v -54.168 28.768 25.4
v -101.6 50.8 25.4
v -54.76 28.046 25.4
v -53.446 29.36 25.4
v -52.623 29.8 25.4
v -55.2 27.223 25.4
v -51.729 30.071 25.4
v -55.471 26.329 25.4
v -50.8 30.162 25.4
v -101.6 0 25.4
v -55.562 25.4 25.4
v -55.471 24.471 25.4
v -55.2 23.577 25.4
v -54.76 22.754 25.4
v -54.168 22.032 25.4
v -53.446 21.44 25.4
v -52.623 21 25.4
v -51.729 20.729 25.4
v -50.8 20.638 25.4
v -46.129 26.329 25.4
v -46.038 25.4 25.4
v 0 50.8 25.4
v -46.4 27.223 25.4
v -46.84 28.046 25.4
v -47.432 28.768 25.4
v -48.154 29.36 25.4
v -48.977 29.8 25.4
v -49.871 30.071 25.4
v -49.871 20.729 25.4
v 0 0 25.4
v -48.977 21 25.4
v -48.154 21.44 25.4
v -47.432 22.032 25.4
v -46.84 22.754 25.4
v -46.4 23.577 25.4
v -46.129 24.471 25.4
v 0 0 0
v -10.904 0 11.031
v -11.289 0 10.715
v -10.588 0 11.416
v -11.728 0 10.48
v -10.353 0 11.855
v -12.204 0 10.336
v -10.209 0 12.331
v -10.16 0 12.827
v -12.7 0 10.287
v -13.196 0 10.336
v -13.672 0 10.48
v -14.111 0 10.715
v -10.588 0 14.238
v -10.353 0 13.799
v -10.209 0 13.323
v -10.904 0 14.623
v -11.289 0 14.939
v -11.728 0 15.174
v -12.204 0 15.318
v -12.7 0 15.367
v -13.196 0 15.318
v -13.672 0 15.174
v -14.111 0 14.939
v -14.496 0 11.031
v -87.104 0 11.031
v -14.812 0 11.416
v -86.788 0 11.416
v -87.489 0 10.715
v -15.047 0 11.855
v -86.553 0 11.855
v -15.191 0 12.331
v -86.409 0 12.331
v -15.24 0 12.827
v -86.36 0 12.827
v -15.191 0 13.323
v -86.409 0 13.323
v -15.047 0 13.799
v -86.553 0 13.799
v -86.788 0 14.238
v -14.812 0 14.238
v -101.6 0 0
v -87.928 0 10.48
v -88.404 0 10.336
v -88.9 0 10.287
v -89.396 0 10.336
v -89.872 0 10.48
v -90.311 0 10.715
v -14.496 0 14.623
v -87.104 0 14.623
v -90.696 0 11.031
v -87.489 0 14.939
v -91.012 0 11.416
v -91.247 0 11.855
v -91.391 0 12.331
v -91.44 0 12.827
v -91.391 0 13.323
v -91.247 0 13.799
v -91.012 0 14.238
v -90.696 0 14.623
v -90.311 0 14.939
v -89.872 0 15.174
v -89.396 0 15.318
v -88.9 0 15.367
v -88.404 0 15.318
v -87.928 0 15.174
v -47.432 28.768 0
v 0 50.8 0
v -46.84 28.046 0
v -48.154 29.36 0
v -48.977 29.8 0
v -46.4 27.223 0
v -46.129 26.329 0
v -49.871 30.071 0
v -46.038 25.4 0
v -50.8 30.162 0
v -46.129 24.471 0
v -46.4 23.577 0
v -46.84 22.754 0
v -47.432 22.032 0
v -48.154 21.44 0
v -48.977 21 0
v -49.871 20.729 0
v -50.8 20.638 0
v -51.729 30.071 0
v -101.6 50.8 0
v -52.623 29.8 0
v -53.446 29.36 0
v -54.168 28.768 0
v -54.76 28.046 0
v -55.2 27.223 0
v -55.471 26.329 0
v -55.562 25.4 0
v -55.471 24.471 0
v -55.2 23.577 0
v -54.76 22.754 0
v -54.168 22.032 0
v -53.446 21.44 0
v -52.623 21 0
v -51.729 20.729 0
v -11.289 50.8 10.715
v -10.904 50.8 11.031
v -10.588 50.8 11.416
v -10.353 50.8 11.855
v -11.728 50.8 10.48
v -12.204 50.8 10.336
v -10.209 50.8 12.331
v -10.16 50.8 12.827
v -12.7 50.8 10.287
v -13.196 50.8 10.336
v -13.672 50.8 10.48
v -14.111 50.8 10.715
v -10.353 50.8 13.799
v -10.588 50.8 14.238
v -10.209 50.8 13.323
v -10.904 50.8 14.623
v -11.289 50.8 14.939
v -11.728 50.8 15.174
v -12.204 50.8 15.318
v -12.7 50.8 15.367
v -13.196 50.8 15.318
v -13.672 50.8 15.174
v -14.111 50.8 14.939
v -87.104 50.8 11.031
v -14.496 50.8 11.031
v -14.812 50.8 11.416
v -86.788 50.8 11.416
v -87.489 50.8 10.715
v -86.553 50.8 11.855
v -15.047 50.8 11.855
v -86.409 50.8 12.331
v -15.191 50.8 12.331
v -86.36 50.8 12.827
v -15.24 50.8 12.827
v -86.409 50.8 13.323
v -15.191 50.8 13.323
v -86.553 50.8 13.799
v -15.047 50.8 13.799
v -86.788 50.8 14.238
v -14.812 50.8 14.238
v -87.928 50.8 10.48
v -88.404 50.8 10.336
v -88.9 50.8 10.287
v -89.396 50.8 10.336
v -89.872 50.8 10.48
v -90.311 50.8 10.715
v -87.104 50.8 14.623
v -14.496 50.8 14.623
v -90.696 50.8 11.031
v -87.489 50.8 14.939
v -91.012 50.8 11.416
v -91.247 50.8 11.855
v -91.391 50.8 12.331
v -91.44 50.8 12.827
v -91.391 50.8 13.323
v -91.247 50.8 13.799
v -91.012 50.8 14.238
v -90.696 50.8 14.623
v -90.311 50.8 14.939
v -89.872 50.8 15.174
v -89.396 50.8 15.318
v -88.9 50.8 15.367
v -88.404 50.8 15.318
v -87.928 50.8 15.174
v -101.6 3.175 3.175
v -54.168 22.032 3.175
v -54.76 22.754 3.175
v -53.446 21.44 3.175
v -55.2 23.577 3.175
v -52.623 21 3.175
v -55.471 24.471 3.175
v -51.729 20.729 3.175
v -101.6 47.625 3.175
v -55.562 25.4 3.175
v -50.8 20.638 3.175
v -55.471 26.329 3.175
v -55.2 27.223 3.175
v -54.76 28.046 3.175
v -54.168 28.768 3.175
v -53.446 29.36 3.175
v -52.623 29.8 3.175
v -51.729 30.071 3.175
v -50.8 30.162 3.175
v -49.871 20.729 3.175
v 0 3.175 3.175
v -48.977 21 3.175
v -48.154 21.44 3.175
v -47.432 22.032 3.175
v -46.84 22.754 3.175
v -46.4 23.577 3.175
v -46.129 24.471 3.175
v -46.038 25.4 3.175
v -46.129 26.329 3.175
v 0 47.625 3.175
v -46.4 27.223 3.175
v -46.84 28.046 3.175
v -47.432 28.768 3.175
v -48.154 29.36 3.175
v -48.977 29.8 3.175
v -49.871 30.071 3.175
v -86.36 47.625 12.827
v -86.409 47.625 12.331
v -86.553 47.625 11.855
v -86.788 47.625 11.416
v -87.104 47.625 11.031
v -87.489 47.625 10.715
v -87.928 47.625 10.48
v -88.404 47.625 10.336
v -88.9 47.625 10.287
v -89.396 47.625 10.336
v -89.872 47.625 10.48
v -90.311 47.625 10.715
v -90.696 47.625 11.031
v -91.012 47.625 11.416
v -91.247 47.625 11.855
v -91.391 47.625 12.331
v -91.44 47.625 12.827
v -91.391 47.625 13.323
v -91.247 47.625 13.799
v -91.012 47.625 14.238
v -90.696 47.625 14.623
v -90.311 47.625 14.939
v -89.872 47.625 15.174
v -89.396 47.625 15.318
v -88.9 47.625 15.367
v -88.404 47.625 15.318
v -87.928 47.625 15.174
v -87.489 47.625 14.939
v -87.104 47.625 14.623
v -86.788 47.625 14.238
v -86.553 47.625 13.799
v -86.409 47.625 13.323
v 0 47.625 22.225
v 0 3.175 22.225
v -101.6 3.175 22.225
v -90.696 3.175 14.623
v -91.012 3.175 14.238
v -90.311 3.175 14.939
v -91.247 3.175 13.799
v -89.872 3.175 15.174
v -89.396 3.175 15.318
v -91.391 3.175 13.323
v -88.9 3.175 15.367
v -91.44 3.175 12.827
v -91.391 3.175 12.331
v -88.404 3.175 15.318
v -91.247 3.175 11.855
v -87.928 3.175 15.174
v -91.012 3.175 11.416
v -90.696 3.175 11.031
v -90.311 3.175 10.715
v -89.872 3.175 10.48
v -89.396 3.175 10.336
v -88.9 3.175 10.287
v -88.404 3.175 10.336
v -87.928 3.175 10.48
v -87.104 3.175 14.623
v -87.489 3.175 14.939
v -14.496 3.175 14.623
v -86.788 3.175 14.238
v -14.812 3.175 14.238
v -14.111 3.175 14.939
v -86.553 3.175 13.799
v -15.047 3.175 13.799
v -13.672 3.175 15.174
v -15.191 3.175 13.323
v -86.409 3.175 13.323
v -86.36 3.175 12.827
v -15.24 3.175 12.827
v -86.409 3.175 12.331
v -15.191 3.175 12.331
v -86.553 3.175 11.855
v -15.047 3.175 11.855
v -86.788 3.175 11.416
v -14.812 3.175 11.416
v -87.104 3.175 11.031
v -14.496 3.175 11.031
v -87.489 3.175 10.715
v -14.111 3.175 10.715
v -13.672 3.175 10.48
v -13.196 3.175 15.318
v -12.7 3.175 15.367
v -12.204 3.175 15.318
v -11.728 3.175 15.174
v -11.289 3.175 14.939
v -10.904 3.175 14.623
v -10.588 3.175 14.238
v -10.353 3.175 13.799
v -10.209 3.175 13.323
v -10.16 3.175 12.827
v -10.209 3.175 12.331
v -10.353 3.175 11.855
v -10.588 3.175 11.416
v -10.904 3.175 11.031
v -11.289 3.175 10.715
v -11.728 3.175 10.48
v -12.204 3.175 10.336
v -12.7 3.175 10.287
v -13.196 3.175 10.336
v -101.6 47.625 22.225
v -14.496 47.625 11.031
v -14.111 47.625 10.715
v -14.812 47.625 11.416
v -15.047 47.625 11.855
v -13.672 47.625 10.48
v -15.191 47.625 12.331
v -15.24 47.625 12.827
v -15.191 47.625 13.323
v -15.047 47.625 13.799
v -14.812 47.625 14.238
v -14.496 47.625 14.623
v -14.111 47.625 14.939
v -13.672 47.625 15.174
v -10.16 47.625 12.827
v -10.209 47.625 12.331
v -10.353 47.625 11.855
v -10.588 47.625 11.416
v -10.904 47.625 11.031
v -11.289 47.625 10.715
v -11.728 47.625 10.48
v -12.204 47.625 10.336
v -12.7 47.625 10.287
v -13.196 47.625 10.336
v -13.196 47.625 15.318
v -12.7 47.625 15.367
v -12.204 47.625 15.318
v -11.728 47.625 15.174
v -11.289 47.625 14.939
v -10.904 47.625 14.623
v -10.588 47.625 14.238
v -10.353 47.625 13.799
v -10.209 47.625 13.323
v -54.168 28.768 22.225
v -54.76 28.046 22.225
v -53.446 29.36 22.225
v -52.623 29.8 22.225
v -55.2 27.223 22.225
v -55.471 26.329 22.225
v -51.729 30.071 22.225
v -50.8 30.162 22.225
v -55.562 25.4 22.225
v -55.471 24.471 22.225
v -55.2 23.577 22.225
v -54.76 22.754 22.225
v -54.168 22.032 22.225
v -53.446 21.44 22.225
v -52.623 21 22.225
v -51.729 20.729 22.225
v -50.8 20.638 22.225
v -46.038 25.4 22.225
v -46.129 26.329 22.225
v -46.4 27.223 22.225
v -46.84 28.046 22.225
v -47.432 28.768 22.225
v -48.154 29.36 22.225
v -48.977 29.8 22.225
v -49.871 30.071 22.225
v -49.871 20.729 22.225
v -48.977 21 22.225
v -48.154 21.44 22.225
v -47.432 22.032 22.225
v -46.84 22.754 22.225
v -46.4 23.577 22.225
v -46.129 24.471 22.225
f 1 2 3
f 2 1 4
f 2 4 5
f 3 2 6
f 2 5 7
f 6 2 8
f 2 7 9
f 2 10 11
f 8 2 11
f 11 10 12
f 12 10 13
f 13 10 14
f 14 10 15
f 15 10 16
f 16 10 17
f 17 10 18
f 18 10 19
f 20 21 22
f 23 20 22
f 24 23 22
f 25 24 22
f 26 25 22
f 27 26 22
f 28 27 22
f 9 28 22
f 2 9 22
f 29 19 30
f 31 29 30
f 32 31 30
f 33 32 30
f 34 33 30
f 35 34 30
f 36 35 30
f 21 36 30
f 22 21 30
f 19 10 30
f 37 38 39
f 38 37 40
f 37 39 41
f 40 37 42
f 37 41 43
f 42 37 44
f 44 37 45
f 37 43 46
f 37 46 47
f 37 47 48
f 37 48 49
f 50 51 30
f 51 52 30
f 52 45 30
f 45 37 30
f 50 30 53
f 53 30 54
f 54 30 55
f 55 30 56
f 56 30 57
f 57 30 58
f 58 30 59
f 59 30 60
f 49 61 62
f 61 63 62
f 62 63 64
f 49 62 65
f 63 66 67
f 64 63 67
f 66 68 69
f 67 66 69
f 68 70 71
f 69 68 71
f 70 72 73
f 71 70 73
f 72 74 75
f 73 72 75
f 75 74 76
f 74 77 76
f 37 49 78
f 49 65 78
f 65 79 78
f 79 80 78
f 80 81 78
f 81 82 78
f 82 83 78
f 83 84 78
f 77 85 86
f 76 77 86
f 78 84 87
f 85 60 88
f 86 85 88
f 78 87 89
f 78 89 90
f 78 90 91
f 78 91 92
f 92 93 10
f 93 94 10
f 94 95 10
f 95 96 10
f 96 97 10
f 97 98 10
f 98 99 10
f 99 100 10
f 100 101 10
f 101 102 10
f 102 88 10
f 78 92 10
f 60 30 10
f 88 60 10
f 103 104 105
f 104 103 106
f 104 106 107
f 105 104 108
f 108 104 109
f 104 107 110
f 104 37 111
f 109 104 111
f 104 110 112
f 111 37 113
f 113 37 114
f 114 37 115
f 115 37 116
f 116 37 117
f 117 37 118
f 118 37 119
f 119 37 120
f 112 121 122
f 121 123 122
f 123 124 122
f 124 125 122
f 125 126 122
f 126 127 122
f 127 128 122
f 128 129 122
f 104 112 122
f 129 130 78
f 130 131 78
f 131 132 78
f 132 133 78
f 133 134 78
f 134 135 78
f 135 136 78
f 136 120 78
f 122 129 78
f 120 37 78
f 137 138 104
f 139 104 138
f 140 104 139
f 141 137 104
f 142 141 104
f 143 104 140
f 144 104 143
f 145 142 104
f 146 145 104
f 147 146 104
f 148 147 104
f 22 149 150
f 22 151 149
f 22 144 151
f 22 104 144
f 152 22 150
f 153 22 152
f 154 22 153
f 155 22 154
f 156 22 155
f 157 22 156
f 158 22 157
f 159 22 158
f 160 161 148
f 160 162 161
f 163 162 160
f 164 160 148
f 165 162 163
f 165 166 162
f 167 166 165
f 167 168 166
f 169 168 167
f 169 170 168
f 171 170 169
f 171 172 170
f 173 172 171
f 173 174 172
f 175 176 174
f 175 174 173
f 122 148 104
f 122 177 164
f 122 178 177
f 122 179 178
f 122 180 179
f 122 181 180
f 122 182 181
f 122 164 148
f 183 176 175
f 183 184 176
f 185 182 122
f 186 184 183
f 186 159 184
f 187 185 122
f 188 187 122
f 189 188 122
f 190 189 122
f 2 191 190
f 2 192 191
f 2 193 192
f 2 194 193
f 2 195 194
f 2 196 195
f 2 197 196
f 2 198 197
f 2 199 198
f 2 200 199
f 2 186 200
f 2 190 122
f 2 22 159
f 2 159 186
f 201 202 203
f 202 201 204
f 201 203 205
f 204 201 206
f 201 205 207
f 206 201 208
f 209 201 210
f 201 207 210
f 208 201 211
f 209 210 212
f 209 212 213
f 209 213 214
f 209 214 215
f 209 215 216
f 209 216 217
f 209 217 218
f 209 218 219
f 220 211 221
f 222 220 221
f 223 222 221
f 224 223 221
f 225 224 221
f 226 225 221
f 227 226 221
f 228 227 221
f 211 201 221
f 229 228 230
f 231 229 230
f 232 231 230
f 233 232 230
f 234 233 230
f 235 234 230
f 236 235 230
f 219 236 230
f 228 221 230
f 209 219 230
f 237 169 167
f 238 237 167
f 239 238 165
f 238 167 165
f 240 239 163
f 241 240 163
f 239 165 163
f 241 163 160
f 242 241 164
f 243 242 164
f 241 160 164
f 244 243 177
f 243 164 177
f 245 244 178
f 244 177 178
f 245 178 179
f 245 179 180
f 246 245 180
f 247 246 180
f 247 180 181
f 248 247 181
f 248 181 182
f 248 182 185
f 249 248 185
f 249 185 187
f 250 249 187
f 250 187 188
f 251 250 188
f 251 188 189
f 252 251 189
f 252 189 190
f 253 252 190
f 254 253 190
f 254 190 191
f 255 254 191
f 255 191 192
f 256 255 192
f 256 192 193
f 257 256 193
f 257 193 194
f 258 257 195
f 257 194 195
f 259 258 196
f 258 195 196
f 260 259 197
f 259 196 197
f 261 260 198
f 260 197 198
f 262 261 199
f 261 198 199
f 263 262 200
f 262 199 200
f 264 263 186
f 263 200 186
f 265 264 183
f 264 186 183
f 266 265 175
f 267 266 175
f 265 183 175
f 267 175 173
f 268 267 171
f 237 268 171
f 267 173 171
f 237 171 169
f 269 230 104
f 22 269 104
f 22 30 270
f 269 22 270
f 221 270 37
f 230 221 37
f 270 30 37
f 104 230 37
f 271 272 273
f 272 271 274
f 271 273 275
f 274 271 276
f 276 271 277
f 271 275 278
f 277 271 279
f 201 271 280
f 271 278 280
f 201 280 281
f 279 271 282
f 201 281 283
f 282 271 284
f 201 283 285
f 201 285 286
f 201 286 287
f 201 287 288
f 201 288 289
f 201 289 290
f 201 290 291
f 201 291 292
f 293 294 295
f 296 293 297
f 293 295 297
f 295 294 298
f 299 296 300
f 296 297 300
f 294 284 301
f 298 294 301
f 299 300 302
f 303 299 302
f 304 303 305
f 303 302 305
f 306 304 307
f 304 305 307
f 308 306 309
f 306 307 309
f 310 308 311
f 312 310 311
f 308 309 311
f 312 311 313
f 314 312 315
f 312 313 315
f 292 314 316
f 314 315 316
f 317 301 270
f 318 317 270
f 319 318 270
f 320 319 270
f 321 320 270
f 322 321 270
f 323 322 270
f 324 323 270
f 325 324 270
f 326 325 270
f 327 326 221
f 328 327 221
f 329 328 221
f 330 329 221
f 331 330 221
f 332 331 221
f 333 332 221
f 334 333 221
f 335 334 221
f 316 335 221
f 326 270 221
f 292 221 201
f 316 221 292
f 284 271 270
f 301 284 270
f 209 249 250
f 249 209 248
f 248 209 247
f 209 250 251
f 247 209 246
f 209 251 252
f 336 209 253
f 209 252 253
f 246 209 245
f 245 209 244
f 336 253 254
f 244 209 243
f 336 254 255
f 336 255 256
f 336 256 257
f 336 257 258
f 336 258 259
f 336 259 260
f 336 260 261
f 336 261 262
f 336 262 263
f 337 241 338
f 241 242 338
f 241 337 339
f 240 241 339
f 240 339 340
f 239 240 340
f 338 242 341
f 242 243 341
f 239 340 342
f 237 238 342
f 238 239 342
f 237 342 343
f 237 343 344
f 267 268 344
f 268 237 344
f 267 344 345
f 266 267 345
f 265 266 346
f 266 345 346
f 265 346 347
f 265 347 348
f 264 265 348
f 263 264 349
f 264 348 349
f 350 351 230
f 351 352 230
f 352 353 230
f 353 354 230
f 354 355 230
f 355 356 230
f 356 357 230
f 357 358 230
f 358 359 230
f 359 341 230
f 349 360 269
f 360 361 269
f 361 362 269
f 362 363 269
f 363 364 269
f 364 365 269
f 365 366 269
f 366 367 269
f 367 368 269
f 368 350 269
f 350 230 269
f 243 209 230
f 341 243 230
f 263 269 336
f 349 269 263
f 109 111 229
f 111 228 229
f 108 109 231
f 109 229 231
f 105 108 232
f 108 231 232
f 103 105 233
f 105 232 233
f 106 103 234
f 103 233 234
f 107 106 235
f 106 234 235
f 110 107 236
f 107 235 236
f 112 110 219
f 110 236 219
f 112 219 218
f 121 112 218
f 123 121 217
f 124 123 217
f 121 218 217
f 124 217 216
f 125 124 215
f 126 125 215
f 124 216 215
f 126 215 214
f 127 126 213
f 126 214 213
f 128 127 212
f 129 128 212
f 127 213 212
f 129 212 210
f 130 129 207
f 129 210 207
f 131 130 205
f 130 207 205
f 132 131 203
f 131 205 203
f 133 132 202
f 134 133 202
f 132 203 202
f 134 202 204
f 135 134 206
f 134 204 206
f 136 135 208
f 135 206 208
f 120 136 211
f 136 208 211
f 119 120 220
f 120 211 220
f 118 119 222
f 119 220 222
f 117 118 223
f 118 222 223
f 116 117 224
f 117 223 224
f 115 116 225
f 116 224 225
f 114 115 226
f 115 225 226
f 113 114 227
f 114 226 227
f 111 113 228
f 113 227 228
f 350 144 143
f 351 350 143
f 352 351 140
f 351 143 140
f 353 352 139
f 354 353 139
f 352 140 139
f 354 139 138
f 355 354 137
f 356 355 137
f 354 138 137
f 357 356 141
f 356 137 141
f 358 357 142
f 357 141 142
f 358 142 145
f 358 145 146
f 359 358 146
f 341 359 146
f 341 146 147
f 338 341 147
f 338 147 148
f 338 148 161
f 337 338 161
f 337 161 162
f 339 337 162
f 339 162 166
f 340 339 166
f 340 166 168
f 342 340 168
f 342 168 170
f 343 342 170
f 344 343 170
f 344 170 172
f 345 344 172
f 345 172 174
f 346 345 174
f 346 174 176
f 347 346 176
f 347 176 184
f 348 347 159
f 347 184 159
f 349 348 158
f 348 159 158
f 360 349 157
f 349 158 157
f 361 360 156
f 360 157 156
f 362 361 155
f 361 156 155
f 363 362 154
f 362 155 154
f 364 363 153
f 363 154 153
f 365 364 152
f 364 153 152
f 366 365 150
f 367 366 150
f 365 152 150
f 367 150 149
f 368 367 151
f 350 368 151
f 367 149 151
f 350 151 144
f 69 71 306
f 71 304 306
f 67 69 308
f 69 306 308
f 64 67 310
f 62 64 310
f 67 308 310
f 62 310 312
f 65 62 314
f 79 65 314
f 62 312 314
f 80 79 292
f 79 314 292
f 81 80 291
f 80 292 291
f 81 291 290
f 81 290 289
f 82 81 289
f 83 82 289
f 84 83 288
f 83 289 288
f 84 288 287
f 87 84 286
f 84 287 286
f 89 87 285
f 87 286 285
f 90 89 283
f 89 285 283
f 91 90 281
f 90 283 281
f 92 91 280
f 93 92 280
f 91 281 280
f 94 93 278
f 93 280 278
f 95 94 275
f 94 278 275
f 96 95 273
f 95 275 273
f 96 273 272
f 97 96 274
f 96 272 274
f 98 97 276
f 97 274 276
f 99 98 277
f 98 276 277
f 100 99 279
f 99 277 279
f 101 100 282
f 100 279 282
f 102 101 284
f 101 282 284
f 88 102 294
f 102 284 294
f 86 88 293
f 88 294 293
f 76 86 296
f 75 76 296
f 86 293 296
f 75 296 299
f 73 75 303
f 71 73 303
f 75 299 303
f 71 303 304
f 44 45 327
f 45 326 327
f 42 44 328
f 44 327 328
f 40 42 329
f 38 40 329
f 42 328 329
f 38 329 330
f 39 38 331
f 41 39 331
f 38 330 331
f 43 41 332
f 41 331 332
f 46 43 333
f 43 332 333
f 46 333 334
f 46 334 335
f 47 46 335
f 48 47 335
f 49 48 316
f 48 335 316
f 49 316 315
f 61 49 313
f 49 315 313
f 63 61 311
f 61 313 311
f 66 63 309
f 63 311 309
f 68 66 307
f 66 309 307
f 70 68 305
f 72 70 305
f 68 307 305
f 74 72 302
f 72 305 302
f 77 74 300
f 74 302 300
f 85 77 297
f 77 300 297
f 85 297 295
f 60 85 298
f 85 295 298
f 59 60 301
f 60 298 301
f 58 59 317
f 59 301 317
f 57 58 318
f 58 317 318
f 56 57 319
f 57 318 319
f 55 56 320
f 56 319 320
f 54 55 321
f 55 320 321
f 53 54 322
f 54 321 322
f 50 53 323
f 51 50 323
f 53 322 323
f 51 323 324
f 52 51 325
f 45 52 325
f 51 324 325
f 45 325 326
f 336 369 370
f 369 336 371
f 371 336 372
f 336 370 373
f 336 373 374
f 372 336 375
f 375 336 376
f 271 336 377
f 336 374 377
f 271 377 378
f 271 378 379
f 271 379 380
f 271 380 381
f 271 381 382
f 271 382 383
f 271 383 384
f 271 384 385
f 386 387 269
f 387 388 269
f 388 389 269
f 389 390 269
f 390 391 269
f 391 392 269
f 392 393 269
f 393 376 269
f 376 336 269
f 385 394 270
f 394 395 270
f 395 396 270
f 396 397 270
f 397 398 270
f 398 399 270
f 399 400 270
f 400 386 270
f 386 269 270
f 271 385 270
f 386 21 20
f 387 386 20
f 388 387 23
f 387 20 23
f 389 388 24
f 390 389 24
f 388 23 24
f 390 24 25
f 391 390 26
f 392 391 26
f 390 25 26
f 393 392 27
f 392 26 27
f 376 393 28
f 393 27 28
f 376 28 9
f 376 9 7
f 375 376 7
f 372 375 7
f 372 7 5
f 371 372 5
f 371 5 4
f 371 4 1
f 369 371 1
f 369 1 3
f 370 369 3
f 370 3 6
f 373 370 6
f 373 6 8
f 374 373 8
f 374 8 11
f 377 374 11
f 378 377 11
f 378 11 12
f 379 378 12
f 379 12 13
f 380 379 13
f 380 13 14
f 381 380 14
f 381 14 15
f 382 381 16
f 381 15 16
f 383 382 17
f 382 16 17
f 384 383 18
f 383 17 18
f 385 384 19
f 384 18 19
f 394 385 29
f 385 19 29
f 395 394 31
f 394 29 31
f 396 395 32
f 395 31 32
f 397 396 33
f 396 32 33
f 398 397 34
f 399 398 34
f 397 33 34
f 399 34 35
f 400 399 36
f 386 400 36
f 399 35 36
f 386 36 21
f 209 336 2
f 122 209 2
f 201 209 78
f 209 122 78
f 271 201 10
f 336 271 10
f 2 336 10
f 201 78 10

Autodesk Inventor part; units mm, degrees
ref_plane "YZ Plane" through (0, 0, 0) normal (1, 0, 0) x (0, 1, 0)
ref_plane "XZ Plane" through (0, 0, 0) normal (0, 1, 0) x (-1, 0, 0)
ref_plane "XY Plane" through (0, 0, 0) normal (0, 0, 1) x (1, 0, 0)
sketch "Sketch1" plane through (0, 0, 0) normal (0, 1, 0) x (-1, 0, 0)
  line L0 (0, 0) -> (101.6, 0)
  line L1 (101.6, 0) -> (101.6, 25.4)
  line L2 (101.6, 25.4) -> (0, 25.4)
  line L3 (0, 25.4) -> (0, 0)
  dimension "d0" = 101.6
  dimension "d1" = 25.4
extrude "Extrusion1" add sketch "Sketch1" along normal blind 50.8
sketch "Sketch2" plane through (-101.6, 0, 25.4) normal (0, 0, 1) x (1, 0, 0)
  circle A0 centre (50.8, 25.4) radius 4.7625
  line L0 (101.6, 50.8) -> (0, 50.8) projected
  line L1 (101.6, 0) -> (101.6, 50.8) projected
  dimension "d4" = 9.525
  dimension "d5" = 25.4
  dimension "d6" = 50.8
extrude "Extrusion2" cut sketch "Sketch2" against normal blind 111.125
sketch "Sketch3" plane through (0, 0, 25.4) normal (1, 0, 0) x (0, 0, -1)
  line L0 (3.175, 3.175) -> (22.225, 3.175)
  line L1 (22.225, 3.175) -> (22.225, 47.625)
  line L2 (22.225, 47.625) -> (3.175, 47.625)
  line L3 (3.175, 47.625) -> (3.175, 3.175)
  line L4 (0, 0) -> (0, 50.8) projected
  line L5 (0, 0) -> (25.4, 0) projected
  line L6 (25.4, 0) -> (25.4, 50.8) projected
  line L7 (25.4, 50.8) -> (0, 50.8) projected
  dimension "d9" = 3.175
  dimension "d10" = 3.175
  dimension "d11" = 3.175
  dimension "d12" = 3.175
extrude "Extrusion3" cut sketch "Sketch3" against normal blind 111.125 contours L3 L2 L1 L0
sketch "Sketch4" plane through (0, 50.8, 0) normal (0, 1, 0) x (1, 0, 0)
  circle A0 centre (-12.7, -12.827) radius 2.54
  circle A1 centre (-88.9, -12.827) radius 2.54
  line L0 (0, 0) -> (-101.6, 0) projected
  line L1 (-101.6, 0) -> (-101.6, -25.4) projected
  line L2 (0, -25.4) -> (0, 0) projected
  dimension "d15" = 5.08
  dimension "d16" = 12.827
  dimension "d17" = 12.7
  dimension "d18" = 5.08
  dimension "d19" = 12.827
  dimension "d20" = 12.7
  dimension "d21" = 76.2
extrude "Extrusion4" cut sketch "Sketch4" against normal blind 111.125
properties part number "15102898-16-P-0306"
